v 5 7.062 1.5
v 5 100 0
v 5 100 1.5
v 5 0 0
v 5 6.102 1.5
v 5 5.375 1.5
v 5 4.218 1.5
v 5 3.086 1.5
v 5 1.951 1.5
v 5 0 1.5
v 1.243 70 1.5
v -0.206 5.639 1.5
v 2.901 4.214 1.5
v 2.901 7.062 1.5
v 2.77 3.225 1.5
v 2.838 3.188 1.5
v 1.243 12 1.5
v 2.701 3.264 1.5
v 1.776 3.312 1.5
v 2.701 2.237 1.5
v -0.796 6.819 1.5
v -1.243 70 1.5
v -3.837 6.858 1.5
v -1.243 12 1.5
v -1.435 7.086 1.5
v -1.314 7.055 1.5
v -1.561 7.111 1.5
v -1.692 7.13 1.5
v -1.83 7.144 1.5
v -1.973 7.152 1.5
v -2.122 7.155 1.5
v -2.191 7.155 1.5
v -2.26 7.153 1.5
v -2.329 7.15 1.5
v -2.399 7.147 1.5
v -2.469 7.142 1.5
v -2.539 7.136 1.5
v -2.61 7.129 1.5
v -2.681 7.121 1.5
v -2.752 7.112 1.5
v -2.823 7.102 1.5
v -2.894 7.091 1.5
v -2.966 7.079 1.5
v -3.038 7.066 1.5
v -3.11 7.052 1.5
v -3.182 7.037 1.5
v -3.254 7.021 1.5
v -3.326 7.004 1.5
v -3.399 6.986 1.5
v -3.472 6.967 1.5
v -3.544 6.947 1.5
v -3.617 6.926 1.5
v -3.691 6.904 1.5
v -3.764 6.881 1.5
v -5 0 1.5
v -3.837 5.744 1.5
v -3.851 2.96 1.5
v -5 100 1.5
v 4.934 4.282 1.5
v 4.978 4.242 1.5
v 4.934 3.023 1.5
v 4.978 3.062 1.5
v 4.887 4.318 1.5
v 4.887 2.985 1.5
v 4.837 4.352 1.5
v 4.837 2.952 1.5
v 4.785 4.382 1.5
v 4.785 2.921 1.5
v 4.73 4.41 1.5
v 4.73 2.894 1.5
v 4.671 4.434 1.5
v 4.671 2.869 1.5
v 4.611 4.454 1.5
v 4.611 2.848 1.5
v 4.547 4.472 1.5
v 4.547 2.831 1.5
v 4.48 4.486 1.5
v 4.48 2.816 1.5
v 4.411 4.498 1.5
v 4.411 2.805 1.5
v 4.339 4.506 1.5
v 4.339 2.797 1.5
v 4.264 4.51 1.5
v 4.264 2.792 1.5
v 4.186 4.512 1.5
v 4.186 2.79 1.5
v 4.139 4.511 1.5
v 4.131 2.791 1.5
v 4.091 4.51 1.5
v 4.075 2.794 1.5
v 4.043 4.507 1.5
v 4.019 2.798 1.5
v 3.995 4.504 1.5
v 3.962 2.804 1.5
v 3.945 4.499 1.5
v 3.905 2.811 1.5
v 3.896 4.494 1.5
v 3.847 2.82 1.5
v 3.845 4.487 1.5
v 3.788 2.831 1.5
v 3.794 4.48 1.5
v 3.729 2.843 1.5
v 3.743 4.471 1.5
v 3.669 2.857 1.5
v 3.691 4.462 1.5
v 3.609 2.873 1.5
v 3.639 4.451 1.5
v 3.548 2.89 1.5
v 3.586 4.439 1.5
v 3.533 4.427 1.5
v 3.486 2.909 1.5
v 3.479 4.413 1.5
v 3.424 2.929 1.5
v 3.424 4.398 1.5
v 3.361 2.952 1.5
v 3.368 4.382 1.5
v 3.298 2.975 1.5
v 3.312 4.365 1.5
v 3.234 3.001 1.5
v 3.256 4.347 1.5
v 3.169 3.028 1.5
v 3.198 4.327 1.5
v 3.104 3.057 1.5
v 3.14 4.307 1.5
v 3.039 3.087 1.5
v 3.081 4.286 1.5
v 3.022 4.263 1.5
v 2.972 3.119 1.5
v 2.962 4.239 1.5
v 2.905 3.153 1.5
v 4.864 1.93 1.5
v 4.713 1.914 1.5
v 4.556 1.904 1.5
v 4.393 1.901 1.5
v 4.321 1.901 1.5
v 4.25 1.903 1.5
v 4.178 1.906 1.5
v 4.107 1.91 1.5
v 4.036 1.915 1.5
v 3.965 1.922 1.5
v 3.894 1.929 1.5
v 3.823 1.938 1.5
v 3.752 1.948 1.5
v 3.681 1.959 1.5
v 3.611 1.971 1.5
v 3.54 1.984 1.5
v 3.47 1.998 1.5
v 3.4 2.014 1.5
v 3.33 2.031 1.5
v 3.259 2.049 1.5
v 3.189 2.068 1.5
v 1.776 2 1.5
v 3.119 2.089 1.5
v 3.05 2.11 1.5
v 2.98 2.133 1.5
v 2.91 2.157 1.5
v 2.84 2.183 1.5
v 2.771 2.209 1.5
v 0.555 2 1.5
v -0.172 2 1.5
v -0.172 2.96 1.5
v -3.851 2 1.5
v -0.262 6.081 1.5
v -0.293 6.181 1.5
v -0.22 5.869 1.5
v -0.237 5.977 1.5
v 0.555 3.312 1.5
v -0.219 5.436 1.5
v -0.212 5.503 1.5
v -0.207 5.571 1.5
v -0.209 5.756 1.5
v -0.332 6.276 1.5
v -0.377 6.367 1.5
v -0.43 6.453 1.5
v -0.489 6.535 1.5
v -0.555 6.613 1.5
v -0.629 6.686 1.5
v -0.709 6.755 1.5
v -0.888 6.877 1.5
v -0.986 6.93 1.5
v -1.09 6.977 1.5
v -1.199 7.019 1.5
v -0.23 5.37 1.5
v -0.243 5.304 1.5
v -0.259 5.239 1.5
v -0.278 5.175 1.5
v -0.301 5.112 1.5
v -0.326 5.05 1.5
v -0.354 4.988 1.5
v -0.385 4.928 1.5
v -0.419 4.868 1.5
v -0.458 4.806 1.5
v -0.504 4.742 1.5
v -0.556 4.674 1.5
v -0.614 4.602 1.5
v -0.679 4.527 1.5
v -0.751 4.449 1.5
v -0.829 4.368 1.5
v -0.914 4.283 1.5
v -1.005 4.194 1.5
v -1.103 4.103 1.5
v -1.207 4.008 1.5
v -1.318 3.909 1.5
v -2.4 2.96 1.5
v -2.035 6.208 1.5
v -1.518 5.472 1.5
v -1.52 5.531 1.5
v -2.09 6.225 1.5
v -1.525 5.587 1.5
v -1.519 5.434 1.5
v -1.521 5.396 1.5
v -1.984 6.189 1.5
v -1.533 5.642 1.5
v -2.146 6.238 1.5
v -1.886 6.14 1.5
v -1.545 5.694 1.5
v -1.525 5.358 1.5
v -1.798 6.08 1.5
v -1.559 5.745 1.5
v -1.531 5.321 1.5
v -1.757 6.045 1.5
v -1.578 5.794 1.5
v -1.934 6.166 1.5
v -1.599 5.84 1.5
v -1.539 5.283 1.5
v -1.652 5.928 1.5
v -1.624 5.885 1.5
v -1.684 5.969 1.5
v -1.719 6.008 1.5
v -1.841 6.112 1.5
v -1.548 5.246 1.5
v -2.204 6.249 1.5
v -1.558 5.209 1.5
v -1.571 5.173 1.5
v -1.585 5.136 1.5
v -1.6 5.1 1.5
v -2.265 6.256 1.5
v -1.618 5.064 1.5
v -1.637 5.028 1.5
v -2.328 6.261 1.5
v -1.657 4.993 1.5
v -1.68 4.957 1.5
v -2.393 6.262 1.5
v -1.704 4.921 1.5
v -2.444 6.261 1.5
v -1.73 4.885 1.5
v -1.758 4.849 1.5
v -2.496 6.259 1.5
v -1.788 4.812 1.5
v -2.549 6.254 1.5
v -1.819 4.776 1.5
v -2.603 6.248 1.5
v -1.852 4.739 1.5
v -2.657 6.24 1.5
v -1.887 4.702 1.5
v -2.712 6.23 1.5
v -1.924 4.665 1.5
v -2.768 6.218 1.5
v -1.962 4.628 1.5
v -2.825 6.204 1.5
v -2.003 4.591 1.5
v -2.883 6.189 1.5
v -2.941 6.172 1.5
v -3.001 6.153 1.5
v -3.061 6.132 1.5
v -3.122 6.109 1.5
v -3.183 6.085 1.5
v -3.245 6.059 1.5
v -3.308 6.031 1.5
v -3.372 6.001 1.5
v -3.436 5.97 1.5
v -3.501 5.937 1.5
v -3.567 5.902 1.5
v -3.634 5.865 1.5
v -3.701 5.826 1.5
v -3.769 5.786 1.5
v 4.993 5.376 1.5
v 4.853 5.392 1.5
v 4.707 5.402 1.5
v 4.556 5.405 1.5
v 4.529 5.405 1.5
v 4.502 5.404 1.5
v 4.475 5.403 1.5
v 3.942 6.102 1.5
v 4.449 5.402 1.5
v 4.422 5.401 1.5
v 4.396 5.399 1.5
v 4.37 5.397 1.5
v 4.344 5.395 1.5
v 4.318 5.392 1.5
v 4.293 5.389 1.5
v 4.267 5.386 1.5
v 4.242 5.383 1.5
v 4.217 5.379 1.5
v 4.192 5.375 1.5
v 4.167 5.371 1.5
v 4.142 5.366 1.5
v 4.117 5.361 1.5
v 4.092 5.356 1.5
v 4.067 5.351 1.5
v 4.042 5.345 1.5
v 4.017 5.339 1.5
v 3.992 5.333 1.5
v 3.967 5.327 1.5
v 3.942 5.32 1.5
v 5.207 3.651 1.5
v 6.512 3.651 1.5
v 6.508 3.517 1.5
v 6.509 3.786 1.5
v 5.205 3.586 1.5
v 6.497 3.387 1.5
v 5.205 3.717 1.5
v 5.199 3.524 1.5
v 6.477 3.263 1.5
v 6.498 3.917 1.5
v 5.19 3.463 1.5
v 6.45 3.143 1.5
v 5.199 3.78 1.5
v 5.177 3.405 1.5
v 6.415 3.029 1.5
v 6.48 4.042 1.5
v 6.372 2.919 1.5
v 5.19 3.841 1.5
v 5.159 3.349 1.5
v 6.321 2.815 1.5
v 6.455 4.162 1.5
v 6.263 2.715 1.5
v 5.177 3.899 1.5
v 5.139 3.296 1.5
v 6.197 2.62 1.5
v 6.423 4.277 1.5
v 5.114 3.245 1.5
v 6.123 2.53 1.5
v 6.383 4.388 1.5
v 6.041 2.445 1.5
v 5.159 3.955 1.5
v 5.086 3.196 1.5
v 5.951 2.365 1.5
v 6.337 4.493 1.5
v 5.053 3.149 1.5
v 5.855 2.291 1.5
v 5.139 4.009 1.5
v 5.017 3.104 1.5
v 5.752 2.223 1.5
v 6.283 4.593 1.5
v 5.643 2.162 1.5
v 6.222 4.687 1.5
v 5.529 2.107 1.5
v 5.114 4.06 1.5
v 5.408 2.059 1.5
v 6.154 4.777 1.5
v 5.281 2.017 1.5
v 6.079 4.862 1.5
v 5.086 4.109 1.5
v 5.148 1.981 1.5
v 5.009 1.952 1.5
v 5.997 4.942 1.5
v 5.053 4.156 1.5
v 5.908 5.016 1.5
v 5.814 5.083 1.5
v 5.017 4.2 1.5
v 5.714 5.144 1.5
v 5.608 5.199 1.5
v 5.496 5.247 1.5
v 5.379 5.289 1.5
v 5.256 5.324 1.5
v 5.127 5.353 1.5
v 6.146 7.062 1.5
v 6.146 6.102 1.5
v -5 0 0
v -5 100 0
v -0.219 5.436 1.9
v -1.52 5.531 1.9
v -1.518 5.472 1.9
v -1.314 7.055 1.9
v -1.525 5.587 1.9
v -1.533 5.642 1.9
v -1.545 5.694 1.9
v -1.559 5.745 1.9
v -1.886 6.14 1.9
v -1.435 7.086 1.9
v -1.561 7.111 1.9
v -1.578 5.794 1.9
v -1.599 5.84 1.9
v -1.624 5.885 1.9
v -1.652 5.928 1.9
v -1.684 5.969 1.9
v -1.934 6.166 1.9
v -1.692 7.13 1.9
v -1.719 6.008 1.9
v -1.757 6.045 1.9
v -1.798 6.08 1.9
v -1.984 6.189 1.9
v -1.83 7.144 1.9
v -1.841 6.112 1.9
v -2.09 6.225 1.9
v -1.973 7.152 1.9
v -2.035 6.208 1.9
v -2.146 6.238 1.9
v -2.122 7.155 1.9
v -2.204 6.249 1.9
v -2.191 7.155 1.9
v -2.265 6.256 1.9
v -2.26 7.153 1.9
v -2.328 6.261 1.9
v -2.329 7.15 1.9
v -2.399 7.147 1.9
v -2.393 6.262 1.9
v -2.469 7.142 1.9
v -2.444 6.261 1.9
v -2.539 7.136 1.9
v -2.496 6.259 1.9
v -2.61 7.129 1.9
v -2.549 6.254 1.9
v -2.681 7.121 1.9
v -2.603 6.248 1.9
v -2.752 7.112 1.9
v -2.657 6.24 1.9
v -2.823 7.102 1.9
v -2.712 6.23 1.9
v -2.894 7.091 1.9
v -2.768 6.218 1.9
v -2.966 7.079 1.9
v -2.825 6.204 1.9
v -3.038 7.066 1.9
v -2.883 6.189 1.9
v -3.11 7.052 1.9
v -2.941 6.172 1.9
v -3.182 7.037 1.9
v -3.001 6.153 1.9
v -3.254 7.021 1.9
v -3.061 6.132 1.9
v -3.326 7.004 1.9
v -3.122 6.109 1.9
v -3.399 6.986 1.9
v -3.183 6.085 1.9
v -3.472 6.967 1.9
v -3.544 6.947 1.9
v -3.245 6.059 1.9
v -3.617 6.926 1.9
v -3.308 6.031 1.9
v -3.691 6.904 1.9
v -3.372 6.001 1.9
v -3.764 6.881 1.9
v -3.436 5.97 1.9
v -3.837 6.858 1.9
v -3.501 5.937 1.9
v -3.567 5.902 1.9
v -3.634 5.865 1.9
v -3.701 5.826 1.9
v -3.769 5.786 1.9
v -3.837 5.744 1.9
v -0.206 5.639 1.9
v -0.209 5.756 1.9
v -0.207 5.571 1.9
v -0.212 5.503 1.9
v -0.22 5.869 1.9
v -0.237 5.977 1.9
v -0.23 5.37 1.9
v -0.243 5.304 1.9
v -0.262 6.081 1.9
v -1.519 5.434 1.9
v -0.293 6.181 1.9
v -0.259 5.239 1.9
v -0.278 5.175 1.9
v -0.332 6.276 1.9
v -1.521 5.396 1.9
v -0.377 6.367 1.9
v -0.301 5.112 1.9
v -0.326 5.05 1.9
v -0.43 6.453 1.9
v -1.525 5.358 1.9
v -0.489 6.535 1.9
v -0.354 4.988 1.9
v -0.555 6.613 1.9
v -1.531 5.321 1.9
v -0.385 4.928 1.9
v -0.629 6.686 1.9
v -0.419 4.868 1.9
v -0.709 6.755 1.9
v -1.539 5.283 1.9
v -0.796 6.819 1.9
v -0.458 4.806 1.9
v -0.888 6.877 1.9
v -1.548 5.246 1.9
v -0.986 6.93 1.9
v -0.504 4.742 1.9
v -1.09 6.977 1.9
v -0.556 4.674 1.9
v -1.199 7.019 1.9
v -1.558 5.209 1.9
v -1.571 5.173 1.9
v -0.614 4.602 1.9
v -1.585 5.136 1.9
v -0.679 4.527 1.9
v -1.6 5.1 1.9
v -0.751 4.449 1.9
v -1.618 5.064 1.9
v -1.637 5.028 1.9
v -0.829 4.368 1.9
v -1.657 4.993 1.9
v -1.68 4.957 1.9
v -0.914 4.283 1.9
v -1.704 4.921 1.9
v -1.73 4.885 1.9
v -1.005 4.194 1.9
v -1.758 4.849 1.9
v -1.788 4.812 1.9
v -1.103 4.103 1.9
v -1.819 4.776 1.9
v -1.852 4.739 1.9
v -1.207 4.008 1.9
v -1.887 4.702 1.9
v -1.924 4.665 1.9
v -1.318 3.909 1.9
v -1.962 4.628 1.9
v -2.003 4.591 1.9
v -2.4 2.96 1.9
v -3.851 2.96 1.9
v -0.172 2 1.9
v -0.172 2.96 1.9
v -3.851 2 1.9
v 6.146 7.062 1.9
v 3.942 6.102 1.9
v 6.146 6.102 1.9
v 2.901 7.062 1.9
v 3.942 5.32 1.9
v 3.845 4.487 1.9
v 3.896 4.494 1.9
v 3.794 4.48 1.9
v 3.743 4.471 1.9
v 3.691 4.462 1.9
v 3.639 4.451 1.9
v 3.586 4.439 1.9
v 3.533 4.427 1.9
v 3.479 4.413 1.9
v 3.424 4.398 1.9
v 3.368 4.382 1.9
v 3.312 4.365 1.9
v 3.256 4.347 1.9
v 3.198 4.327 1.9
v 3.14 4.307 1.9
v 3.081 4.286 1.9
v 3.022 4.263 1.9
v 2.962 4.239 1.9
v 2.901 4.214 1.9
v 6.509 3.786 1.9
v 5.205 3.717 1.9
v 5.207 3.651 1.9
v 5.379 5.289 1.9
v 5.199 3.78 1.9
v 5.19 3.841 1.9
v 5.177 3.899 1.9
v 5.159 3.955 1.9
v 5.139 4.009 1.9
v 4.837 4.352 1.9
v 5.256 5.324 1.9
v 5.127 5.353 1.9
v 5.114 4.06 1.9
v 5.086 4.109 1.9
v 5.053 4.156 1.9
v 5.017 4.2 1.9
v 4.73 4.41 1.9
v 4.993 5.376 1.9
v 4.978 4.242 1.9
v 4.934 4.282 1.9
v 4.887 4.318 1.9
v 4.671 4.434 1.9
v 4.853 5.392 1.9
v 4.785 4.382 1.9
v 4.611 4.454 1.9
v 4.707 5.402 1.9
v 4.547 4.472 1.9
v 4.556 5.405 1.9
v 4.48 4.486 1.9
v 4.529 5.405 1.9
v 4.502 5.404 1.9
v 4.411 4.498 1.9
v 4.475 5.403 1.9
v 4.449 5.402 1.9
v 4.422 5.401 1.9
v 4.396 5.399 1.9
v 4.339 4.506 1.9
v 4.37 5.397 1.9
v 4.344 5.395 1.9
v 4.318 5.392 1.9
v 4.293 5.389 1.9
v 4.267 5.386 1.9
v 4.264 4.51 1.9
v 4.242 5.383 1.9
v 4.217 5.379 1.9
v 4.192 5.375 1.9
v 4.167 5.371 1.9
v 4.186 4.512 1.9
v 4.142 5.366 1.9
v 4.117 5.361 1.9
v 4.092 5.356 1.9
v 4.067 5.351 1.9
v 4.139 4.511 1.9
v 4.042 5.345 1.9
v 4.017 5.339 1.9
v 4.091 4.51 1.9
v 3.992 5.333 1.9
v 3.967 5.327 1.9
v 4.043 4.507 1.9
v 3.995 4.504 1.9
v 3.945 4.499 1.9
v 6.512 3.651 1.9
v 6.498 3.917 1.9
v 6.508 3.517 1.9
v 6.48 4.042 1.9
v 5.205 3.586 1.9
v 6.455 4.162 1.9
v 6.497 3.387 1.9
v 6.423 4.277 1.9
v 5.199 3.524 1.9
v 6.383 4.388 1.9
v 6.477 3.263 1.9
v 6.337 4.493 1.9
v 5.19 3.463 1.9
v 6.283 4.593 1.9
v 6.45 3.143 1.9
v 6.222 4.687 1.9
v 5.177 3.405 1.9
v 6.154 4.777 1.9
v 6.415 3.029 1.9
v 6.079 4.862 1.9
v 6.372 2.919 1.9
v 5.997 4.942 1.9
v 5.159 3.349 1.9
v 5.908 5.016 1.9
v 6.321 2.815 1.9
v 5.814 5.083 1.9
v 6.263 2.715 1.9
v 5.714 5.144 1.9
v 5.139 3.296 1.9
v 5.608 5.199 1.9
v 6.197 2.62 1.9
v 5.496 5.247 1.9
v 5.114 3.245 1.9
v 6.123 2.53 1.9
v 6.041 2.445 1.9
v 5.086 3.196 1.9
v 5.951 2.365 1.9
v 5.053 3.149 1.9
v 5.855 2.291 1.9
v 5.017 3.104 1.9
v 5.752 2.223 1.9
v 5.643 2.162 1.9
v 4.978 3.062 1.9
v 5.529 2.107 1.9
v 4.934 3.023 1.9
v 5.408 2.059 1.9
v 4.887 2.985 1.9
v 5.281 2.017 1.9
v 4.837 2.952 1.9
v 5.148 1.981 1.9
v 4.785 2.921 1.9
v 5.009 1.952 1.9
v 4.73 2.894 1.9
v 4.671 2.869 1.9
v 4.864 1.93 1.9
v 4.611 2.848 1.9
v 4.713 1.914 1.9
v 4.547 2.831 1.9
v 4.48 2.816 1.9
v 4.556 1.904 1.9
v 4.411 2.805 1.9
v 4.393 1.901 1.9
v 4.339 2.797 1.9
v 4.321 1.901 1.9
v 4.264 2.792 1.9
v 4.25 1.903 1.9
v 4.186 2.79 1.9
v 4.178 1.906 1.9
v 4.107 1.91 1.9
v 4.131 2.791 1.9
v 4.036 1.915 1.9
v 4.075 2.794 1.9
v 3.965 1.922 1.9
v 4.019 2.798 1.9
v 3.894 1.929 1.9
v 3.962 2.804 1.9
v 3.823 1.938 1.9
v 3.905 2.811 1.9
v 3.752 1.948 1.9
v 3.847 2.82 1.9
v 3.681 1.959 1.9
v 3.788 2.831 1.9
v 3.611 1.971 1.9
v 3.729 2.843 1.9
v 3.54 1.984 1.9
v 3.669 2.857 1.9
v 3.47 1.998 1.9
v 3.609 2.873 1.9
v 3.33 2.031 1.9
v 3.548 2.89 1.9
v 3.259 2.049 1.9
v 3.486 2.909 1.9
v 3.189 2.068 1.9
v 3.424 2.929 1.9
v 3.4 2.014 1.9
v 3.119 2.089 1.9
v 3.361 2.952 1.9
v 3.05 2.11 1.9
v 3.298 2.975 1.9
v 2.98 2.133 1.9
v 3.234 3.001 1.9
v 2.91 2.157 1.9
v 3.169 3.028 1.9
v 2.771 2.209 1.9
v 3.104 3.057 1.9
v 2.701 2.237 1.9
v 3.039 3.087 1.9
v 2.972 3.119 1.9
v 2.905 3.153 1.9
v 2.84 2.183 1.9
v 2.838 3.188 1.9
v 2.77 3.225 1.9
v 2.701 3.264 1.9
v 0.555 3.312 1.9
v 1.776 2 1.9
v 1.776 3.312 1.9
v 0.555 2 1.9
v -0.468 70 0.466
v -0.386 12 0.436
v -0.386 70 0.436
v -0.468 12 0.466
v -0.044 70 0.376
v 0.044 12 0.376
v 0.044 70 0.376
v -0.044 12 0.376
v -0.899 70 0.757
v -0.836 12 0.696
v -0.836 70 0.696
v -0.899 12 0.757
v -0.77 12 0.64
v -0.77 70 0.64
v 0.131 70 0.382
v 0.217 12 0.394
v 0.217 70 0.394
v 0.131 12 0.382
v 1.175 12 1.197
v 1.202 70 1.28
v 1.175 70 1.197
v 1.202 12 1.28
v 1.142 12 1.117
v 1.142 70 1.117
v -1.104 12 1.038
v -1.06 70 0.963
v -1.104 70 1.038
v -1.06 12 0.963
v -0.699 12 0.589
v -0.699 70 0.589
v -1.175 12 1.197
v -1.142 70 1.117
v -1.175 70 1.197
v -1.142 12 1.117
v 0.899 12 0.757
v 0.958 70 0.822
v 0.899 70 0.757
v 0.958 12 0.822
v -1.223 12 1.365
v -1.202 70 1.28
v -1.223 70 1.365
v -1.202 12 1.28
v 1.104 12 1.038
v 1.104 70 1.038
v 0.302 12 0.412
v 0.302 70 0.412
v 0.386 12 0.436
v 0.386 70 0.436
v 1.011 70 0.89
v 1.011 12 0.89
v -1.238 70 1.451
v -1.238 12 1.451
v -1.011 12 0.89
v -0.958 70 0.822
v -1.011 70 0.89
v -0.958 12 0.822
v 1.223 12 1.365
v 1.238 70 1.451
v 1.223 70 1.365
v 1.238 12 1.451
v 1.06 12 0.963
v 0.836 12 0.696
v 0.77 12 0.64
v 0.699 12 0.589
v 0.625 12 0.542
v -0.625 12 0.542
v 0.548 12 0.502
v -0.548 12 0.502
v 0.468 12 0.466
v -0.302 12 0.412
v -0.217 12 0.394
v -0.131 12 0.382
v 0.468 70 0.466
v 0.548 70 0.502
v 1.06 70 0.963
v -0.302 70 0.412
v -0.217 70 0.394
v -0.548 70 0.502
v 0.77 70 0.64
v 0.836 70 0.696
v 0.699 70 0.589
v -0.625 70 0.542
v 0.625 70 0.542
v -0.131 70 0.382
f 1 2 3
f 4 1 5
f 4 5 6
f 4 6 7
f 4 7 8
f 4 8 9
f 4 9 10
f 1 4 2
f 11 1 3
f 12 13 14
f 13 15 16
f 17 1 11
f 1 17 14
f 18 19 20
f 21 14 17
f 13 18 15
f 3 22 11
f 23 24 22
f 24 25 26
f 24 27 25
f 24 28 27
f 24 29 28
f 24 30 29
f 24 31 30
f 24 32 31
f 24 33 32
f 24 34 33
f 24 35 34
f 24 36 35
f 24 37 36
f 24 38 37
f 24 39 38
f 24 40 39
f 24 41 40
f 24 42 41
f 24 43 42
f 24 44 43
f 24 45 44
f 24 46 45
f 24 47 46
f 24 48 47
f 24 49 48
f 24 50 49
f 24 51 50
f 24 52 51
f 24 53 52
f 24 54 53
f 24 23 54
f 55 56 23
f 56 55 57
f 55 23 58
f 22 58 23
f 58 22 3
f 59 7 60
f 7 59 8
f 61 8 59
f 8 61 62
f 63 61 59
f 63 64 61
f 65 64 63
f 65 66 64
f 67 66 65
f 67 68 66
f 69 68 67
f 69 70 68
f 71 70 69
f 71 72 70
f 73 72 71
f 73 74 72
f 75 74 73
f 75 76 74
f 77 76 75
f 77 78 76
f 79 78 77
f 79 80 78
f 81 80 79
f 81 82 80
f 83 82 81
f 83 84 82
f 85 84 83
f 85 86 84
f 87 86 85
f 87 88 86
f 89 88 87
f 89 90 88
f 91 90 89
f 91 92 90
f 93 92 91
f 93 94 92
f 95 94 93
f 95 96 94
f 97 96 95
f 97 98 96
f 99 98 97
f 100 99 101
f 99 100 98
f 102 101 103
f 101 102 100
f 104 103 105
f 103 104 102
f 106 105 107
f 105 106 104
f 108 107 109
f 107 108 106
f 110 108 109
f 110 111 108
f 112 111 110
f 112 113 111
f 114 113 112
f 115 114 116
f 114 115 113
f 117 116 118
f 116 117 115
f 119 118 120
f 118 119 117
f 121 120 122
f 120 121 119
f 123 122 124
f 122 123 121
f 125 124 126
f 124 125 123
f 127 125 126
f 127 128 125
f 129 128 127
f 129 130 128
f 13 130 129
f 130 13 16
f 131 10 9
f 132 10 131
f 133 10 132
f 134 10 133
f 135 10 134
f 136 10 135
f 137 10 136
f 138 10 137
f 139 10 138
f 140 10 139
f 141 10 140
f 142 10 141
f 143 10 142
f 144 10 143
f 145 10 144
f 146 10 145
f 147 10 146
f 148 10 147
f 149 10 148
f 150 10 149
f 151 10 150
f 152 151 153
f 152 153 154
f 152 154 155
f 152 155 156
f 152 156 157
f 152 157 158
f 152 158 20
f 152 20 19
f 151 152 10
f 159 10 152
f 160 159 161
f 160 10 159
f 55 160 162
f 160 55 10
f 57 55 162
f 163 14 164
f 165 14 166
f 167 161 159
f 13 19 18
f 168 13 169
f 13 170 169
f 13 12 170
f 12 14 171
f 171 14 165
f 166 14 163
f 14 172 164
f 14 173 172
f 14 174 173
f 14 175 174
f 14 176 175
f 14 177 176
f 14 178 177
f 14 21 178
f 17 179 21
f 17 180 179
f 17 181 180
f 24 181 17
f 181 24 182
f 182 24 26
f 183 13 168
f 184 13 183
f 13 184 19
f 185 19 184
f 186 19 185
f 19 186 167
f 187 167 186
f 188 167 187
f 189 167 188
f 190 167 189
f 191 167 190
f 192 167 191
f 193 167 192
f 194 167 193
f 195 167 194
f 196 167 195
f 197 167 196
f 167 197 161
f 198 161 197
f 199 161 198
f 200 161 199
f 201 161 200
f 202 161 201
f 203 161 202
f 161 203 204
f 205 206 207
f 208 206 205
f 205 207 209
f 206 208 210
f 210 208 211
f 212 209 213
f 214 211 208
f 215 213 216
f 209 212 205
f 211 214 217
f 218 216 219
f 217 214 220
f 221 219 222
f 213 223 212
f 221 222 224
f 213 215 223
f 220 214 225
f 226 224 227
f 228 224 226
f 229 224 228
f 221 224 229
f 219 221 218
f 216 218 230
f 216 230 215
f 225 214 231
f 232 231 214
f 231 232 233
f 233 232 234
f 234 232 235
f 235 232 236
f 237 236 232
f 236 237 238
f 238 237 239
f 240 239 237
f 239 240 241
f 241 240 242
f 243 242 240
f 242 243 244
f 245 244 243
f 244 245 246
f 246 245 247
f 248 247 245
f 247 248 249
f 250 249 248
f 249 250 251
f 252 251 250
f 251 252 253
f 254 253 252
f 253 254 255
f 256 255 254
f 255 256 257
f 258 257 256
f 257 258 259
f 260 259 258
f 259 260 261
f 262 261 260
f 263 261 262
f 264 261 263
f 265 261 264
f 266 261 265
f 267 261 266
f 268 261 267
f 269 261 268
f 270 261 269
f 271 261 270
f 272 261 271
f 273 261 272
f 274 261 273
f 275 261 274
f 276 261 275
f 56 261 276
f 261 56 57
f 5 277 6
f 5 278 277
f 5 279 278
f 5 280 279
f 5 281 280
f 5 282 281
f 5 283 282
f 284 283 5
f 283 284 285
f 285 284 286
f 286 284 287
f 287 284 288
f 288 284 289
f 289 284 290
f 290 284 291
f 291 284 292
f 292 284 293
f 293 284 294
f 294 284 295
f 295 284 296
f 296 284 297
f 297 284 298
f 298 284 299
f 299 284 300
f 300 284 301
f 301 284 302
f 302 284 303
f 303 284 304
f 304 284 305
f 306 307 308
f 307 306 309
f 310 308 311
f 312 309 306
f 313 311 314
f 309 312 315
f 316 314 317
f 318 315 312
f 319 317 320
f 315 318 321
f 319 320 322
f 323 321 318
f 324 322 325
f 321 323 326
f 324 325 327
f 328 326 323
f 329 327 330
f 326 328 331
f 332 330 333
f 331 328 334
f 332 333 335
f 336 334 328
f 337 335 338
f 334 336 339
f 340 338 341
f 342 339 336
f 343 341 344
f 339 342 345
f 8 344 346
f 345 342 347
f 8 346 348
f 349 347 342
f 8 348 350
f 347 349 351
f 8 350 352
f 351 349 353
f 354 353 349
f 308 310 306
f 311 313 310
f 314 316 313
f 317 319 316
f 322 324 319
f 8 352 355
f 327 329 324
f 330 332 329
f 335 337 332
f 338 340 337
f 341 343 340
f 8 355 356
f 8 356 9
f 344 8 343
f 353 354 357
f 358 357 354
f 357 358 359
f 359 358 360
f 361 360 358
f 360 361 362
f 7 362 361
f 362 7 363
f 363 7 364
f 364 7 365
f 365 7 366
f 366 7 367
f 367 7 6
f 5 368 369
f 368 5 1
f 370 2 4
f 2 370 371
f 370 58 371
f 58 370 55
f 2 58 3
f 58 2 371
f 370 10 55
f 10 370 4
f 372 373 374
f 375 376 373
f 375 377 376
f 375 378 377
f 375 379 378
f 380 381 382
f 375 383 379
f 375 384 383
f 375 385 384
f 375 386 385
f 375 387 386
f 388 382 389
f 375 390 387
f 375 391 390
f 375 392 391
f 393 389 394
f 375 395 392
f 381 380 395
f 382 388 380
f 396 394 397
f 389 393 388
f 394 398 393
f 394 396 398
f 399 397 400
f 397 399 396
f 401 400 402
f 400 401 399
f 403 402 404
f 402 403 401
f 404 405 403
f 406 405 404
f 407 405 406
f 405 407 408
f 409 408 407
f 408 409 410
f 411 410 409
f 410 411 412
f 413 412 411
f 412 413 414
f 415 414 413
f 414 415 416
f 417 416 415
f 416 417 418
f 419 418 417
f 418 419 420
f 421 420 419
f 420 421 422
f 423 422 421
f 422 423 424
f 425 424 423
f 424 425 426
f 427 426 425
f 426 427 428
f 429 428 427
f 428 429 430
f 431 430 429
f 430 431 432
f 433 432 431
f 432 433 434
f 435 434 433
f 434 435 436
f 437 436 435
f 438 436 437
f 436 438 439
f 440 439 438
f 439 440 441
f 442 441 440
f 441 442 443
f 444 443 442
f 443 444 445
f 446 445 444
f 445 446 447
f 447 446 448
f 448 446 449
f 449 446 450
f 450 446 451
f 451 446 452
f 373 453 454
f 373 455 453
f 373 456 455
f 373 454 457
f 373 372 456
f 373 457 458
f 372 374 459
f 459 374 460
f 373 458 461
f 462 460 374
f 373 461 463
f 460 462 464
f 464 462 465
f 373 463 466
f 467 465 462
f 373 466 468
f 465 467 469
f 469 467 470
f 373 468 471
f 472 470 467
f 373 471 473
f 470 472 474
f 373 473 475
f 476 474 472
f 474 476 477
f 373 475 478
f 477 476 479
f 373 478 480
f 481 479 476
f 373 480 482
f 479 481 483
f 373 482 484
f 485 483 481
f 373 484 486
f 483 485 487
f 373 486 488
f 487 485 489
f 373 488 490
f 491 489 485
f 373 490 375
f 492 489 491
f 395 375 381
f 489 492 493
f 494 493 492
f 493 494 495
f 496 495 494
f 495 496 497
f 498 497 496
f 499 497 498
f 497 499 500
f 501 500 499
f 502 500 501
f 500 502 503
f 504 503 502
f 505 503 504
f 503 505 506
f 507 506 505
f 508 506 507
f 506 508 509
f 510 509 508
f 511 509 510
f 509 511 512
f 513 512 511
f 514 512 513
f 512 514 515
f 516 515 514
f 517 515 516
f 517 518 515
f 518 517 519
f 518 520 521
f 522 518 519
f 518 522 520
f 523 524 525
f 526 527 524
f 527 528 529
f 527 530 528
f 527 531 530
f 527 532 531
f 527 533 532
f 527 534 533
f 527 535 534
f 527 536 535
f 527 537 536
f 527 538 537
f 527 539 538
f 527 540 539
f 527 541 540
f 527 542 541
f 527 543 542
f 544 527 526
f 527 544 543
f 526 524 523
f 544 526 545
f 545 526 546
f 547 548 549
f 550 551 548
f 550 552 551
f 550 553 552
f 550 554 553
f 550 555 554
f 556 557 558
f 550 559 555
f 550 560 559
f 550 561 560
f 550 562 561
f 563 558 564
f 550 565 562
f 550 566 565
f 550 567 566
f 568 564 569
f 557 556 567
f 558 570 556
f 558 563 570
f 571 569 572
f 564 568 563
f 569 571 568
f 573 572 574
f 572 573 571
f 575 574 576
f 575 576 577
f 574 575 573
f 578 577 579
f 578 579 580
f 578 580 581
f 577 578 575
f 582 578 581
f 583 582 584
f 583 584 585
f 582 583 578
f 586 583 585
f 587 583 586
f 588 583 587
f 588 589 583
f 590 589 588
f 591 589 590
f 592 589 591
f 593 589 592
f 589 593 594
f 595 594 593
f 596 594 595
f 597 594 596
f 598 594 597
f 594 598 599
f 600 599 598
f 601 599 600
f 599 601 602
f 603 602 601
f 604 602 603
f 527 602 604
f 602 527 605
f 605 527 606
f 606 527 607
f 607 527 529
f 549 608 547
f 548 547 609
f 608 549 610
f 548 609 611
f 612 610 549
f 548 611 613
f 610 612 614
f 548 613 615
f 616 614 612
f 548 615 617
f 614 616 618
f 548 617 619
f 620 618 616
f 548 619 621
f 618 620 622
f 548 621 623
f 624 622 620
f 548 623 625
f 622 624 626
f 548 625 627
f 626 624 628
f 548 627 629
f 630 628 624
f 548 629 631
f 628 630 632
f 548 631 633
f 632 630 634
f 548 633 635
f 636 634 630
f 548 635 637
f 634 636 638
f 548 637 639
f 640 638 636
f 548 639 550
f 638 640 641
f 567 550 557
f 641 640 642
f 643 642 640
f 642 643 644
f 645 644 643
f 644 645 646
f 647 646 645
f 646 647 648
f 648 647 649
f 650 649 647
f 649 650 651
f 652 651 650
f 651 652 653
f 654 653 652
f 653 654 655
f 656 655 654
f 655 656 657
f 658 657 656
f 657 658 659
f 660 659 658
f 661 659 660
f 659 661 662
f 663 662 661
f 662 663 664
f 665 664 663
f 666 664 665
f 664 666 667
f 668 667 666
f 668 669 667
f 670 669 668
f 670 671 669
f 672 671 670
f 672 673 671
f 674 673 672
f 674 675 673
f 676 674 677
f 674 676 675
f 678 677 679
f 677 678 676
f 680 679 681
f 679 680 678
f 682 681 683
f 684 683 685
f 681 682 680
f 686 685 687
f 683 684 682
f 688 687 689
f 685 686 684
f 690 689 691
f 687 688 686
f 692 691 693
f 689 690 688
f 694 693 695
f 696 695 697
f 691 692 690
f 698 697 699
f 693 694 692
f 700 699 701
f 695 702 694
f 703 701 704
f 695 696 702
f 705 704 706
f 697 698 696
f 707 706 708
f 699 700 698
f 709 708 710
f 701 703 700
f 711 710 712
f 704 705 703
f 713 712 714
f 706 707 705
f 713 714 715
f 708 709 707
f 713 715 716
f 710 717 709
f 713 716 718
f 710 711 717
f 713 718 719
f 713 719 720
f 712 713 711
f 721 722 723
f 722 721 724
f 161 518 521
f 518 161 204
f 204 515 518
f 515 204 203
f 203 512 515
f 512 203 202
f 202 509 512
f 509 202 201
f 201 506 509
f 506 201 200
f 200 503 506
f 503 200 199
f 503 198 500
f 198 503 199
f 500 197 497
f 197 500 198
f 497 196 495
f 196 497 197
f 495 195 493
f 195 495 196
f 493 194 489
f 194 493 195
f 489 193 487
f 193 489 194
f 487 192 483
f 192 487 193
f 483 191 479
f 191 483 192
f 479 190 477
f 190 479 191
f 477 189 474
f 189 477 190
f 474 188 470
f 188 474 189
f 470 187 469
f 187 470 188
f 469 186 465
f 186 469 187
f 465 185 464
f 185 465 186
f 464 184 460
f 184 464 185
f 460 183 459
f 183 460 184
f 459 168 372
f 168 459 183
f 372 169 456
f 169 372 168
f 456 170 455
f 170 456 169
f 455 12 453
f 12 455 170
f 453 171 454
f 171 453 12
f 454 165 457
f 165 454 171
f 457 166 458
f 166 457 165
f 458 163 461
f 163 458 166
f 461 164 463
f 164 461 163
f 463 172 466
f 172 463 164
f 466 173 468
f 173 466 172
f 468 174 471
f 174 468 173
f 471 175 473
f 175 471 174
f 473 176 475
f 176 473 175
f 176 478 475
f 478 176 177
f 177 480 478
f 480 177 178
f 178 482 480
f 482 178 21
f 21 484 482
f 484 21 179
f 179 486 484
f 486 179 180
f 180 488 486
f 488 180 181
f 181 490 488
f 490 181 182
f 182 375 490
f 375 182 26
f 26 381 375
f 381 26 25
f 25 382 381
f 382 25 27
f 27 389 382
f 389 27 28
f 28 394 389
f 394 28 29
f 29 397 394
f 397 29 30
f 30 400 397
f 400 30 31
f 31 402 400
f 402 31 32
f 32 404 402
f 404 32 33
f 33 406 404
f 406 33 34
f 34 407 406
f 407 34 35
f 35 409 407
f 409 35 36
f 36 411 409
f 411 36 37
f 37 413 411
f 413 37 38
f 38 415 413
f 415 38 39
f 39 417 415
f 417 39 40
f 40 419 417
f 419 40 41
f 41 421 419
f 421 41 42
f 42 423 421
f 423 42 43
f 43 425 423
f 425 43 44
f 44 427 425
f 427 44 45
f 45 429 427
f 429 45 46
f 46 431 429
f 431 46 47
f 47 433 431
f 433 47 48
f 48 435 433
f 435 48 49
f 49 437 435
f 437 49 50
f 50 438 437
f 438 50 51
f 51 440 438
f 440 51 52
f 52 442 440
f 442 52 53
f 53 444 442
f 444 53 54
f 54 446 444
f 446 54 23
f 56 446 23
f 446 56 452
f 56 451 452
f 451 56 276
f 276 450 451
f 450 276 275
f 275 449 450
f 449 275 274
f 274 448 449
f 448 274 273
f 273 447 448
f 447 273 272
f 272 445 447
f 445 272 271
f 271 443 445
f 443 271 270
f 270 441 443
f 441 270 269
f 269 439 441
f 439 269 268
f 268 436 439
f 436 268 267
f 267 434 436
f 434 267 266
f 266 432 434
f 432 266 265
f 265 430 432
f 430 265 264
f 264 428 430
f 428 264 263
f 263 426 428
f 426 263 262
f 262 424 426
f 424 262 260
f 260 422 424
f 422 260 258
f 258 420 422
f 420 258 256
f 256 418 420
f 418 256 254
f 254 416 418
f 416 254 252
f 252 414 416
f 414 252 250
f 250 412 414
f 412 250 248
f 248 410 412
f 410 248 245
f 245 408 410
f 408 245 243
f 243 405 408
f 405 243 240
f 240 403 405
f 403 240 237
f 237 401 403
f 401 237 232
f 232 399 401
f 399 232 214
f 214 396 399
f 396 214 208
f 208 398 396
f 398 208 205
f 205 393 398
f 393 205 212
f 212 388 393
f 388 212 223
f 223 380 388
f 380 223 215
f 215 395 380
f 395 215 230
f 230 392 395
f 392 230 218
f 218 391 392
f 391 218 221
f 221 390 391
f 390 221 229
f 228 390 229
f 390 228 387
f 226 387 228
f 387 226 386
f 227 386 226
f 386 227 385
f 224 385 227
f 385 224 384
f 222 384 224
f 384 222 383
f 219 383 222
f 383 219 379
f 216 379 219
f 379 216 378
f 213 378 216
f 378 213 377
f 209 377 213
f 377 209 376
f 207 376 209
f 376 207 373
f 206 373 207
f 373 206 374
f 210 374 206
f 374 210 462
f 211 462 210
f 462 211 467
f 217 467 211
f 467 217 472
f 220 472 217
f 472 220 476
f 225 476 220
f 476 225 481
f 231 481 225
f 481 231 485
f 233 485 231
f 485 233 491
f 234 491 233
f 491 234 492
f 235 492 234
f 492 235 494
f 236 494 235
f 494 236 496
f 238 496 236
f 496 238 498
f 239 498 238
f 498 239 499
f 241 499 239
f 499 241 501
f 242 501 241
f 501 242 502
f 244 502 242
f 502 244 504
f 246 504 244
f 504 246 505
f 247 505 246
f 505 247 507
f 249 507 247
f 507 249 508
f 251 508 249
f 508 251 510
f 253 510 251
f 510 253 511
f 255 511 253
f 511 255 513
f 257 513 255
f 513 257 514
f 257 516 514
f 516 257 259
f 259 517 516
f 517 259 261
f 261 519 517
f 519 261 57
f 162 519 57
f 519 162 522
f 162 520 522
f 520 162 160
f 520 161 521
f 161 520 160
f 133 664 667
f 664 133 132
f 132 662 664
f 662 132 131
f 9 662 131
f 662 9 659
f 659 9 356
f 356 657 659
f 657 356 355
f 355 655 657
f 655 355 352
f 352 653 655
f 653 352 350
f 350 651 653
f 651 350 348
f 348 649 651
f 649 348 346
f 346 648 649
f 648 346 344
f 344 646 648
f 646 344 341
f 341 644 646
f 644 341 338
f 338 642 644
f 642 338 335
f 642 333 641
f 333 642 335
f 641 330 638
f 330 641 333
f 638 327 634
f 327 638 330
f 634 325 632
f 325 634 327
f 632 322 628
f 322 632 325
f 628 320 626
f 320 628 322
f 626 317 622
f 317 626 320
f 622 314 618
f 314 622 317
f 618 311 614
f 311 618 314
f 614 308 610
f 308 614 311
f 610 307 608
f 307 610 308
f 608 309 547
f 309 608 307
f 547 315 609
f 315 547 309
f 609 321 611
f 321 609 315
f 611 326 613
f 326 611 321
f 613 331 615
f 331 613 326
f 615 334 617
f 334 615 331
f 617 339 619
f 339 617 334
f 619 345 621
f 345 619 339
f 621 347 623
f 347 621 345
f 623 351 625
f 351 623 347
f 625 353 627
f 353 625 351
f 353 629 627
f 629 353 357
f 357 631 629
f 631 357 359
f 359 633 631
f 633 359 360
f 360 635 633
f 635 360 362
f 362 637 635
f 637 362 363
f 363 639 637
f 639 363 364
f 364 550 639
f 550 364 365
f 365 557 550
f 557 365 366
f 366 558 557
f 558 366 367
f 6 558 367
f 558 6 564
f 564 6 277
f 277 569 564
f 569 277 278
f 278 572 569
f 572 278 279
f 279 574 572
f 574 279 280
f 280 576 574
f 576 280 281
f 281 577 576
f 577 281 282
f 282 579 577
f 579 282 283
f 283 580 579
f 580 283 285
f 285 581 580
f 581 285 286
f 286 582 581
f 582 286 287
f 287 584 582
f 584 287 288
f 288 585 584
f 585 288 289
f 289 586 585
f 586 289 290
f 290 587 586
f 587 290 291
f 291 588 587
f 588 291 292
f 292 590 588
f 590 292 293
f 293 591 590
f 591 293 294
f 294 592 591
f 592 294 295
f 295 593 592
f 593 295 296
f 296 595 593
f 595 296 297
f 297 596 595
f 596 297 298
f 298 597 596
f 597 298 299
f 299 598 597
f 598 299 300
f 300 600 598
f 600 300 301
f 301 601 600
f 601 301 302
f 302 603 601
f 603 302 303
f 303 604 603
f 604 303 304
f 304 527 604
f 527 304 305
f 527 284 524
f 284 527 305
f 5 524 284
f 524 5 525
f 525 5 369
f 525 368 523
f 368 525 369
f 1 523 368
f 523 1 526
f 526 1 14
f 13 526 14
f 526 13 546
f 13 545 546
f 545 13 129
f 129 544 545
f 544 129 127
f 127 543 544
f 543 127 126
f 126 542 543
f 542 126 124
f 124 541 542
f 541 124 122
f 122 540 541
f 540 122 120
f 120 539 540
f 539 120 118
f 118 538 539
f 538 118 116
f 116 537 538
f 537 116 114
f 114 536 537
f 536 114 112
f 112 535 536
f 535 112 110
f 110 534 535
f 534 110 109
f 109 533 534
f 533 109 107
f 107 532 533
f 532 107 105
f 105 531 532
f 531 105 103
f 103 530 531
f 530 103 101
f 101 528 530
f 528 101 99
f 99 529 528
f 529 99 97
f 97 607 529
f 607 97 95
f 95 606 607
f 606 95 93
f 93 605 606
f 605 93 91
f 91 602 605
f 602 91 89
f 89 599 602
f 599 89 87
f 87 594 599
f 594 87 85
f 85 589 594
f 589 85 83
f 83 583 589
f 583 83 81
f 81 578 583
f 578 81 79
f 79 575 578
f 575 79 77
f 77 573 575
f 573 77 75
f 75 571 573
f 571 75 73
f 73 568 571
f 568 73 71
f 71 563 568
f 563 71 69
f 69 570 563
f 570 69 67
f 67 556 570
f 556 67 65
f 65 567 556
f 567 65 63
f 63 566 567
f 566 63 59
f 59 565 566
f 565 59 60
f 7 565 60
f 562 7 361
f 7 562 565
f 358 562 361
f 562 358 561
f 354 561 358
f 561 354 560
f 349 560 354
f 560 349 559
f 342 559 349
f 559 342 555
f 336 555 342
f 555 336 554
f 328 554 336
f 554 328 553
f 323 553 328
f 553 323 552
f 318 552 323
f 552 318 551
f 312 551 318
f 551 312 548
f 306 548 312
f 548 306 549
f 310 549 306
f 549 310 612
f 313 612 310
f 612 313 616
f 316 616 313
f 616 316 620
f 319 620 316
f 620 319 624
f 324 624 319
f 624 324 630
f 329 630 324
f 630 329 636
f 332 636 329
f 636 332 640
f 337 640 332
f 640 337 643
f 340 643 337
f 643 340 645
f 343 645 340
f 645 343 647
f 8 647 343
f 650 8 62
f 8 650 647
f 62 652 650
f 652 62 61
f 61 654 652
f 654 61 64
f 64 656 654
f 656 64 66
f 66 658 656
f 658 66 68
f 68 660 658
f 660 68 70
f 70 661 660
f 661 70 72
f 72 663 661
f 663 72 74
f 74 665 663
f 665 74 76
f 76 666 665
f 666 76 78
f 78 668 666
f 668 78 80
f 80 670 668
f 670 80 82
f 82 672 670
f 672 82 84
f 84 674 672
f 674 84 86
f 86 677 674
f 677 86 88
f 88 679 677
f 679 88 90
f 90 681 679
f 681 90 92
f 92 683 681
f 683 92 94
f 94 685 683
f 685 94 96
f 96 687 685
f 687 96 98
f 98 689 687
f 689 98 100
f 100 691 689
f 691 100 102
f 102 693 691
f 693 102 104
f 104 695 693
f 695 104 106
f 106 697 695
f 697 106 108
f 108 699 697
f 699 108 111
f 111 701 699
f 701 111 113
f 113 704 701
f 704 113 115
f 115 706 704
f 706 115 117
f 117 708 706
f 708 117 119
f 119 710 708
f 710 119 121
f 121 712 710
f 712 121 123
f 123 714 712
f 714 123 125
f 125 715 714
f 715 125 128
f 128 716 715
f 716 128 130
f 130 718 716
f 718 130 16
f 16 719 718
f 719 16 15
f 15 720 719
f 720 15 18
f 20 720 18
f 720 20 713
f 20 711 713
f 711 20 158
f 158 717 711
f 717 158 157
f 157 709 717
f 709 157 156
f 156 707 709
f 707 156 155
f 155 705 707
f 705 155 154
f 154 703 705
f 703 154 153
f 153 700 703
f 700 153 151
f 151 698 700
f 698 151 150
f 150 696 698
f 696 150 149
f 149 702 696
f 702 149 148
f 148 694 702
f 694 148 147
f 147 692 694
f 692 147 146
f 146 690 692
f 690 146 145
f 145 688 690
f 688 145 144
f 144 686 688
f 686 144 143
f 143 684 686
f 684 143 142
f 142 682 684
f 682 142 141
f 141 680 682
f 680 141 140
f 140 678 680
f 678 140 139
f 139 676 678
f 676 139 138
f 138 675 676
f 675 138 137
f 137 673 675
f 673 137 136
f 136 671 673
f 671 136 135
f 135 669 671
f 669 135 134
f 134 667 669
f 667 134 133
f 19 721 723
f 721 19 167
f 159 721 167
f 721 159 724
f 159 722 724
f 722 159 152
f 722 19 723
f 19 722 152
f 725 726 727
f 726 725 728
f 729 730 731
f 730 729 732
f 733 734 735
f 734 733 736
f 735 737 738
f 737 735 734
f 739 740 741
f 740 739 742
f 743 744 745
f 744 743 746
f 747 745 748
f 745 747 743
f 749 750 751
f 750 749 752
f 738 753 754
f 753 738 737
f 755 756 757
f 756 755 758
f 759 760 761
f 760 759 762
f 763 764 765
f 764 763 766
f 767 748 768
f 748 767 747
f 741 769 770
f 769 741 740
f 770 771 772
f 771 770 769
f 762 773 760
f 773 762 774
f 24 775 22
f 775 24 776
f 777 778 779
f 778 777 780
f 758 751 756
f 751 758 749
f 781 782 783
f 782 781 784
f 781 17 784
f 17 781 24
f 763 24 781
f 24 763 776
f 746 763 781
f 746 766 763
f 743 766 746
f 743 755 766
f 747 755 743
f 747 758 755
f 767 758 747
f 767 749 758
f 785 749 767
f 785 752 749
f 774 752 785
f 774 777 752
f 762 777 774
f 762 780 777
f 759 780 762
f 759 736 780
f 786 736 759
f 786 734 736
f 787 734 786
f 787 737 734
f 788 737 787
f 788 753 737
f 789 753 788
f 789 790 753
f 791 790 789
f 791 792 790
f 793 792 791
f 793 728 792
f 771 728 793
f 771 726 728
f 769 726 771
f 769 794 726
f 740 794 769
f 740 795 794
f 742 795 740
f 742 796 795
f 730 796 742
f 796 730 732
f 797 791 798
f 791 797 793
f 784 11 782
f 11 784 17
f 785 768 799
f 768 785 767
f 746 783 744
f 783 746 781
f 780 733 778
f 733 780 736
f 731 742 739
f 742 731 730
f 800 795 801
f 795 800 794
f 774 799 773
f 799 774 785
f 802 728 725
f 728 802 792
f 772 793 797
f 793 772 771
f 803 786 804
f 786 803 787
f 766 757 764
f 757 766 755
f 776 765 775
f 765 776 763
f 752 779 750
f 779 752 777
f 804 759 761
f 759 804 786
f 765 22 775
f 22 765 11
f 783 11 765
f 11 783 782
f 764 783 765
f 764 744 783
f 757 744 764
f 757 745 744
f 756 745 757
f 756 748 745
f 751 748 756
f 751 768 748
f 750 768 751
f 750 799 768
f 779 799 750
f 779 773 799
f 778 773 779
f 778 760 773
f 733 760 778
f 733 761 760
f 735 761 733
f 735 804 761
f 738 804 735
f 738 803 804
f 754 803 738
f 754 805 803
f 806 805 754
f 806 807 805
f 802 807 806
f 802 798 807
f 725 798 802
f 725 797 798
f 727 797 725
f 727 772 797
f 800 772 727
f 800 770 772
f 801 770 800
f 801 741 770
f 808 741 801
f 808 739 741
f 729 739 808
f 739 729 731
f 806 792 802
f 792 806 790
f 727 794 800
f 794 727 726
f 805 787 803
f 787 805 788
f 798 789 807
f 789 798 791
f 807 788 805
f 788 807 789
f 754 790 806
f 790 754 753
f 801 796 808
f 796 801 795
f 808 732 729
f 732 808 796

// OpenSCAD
// file: module/drill-bit-storage.scad
/*
    Drill bit storage
*/

$fn=90;  // accuracy


// Constants (Don't change)
storageLenght = 100; // Not Bit lenght
maxBitLenght  = 70;  // Check bit lenght
storageWidth  = 10;  // Minimum width

// Bit dependent
bitDiameter = 4.0;



module drillBitStorage (bitDiameter,maxBitLenght,
	storageWidth,storageLenght){

// Automatic Variables  (Don't change)
diameterText      = str(bitDiameter);
storageHight      = bitDiameter*0.6; 
bitRadius         = bitDiameter/2;
bitPositionHeight = storageHight+bitDiameter*0.05; 


// Delition for crating drill track
difference() {

// Union for text and storage
union(){

// Storage 
translate([
    -storageWidth/2,    // Centering
    0, 
    0
    ]) 
cube(size = [
    storageWidth,
    storageLenght,
    storageHight
    ]);

// Milimiter dimension text
translate([
    -4.4,               // Fine deling x-axis
    2,                  // Fine deling y-axis 
    storageHight         
    ])
linear_extrude(height=0.4)text(
    diameterText,  // Dynamic text
    size=5,
    font="tohoma:style=bold",
    spacing=0.9
    );
    
// End of union    
}  

// Begining of Delition
// Drill tracl
rotate([90,0,0])
translate([
    0,                   // x-axis
    bitPositionHeight,   // Z-axis
    -(maxBitLenght+12)    // y-axis
    ])  
cylinder(
    h = maxBitLenght,    // y-axis
    r = bitRadius        // x-axis 
    );      

// End of Delition
}}
// main file
/*
    Drill bit storage
*/

$fn=90;  // accuracy

// import module
use <module/drill-bit-storage.scad>;



// Tootale lenght of the unit
storageLenght = 100; 

// Width of the unit
storageWidth  = 10;  // (Constant under 4mm)  

// The lenght of the drill bit
maxBitLenght  = 58;  

// Drill bit diameter  
bitDiameter = 2.5;


// Call the module
drillBitStorage 
    (bitDiameter,maxBitLenght,storageWidth,storageLenght);
